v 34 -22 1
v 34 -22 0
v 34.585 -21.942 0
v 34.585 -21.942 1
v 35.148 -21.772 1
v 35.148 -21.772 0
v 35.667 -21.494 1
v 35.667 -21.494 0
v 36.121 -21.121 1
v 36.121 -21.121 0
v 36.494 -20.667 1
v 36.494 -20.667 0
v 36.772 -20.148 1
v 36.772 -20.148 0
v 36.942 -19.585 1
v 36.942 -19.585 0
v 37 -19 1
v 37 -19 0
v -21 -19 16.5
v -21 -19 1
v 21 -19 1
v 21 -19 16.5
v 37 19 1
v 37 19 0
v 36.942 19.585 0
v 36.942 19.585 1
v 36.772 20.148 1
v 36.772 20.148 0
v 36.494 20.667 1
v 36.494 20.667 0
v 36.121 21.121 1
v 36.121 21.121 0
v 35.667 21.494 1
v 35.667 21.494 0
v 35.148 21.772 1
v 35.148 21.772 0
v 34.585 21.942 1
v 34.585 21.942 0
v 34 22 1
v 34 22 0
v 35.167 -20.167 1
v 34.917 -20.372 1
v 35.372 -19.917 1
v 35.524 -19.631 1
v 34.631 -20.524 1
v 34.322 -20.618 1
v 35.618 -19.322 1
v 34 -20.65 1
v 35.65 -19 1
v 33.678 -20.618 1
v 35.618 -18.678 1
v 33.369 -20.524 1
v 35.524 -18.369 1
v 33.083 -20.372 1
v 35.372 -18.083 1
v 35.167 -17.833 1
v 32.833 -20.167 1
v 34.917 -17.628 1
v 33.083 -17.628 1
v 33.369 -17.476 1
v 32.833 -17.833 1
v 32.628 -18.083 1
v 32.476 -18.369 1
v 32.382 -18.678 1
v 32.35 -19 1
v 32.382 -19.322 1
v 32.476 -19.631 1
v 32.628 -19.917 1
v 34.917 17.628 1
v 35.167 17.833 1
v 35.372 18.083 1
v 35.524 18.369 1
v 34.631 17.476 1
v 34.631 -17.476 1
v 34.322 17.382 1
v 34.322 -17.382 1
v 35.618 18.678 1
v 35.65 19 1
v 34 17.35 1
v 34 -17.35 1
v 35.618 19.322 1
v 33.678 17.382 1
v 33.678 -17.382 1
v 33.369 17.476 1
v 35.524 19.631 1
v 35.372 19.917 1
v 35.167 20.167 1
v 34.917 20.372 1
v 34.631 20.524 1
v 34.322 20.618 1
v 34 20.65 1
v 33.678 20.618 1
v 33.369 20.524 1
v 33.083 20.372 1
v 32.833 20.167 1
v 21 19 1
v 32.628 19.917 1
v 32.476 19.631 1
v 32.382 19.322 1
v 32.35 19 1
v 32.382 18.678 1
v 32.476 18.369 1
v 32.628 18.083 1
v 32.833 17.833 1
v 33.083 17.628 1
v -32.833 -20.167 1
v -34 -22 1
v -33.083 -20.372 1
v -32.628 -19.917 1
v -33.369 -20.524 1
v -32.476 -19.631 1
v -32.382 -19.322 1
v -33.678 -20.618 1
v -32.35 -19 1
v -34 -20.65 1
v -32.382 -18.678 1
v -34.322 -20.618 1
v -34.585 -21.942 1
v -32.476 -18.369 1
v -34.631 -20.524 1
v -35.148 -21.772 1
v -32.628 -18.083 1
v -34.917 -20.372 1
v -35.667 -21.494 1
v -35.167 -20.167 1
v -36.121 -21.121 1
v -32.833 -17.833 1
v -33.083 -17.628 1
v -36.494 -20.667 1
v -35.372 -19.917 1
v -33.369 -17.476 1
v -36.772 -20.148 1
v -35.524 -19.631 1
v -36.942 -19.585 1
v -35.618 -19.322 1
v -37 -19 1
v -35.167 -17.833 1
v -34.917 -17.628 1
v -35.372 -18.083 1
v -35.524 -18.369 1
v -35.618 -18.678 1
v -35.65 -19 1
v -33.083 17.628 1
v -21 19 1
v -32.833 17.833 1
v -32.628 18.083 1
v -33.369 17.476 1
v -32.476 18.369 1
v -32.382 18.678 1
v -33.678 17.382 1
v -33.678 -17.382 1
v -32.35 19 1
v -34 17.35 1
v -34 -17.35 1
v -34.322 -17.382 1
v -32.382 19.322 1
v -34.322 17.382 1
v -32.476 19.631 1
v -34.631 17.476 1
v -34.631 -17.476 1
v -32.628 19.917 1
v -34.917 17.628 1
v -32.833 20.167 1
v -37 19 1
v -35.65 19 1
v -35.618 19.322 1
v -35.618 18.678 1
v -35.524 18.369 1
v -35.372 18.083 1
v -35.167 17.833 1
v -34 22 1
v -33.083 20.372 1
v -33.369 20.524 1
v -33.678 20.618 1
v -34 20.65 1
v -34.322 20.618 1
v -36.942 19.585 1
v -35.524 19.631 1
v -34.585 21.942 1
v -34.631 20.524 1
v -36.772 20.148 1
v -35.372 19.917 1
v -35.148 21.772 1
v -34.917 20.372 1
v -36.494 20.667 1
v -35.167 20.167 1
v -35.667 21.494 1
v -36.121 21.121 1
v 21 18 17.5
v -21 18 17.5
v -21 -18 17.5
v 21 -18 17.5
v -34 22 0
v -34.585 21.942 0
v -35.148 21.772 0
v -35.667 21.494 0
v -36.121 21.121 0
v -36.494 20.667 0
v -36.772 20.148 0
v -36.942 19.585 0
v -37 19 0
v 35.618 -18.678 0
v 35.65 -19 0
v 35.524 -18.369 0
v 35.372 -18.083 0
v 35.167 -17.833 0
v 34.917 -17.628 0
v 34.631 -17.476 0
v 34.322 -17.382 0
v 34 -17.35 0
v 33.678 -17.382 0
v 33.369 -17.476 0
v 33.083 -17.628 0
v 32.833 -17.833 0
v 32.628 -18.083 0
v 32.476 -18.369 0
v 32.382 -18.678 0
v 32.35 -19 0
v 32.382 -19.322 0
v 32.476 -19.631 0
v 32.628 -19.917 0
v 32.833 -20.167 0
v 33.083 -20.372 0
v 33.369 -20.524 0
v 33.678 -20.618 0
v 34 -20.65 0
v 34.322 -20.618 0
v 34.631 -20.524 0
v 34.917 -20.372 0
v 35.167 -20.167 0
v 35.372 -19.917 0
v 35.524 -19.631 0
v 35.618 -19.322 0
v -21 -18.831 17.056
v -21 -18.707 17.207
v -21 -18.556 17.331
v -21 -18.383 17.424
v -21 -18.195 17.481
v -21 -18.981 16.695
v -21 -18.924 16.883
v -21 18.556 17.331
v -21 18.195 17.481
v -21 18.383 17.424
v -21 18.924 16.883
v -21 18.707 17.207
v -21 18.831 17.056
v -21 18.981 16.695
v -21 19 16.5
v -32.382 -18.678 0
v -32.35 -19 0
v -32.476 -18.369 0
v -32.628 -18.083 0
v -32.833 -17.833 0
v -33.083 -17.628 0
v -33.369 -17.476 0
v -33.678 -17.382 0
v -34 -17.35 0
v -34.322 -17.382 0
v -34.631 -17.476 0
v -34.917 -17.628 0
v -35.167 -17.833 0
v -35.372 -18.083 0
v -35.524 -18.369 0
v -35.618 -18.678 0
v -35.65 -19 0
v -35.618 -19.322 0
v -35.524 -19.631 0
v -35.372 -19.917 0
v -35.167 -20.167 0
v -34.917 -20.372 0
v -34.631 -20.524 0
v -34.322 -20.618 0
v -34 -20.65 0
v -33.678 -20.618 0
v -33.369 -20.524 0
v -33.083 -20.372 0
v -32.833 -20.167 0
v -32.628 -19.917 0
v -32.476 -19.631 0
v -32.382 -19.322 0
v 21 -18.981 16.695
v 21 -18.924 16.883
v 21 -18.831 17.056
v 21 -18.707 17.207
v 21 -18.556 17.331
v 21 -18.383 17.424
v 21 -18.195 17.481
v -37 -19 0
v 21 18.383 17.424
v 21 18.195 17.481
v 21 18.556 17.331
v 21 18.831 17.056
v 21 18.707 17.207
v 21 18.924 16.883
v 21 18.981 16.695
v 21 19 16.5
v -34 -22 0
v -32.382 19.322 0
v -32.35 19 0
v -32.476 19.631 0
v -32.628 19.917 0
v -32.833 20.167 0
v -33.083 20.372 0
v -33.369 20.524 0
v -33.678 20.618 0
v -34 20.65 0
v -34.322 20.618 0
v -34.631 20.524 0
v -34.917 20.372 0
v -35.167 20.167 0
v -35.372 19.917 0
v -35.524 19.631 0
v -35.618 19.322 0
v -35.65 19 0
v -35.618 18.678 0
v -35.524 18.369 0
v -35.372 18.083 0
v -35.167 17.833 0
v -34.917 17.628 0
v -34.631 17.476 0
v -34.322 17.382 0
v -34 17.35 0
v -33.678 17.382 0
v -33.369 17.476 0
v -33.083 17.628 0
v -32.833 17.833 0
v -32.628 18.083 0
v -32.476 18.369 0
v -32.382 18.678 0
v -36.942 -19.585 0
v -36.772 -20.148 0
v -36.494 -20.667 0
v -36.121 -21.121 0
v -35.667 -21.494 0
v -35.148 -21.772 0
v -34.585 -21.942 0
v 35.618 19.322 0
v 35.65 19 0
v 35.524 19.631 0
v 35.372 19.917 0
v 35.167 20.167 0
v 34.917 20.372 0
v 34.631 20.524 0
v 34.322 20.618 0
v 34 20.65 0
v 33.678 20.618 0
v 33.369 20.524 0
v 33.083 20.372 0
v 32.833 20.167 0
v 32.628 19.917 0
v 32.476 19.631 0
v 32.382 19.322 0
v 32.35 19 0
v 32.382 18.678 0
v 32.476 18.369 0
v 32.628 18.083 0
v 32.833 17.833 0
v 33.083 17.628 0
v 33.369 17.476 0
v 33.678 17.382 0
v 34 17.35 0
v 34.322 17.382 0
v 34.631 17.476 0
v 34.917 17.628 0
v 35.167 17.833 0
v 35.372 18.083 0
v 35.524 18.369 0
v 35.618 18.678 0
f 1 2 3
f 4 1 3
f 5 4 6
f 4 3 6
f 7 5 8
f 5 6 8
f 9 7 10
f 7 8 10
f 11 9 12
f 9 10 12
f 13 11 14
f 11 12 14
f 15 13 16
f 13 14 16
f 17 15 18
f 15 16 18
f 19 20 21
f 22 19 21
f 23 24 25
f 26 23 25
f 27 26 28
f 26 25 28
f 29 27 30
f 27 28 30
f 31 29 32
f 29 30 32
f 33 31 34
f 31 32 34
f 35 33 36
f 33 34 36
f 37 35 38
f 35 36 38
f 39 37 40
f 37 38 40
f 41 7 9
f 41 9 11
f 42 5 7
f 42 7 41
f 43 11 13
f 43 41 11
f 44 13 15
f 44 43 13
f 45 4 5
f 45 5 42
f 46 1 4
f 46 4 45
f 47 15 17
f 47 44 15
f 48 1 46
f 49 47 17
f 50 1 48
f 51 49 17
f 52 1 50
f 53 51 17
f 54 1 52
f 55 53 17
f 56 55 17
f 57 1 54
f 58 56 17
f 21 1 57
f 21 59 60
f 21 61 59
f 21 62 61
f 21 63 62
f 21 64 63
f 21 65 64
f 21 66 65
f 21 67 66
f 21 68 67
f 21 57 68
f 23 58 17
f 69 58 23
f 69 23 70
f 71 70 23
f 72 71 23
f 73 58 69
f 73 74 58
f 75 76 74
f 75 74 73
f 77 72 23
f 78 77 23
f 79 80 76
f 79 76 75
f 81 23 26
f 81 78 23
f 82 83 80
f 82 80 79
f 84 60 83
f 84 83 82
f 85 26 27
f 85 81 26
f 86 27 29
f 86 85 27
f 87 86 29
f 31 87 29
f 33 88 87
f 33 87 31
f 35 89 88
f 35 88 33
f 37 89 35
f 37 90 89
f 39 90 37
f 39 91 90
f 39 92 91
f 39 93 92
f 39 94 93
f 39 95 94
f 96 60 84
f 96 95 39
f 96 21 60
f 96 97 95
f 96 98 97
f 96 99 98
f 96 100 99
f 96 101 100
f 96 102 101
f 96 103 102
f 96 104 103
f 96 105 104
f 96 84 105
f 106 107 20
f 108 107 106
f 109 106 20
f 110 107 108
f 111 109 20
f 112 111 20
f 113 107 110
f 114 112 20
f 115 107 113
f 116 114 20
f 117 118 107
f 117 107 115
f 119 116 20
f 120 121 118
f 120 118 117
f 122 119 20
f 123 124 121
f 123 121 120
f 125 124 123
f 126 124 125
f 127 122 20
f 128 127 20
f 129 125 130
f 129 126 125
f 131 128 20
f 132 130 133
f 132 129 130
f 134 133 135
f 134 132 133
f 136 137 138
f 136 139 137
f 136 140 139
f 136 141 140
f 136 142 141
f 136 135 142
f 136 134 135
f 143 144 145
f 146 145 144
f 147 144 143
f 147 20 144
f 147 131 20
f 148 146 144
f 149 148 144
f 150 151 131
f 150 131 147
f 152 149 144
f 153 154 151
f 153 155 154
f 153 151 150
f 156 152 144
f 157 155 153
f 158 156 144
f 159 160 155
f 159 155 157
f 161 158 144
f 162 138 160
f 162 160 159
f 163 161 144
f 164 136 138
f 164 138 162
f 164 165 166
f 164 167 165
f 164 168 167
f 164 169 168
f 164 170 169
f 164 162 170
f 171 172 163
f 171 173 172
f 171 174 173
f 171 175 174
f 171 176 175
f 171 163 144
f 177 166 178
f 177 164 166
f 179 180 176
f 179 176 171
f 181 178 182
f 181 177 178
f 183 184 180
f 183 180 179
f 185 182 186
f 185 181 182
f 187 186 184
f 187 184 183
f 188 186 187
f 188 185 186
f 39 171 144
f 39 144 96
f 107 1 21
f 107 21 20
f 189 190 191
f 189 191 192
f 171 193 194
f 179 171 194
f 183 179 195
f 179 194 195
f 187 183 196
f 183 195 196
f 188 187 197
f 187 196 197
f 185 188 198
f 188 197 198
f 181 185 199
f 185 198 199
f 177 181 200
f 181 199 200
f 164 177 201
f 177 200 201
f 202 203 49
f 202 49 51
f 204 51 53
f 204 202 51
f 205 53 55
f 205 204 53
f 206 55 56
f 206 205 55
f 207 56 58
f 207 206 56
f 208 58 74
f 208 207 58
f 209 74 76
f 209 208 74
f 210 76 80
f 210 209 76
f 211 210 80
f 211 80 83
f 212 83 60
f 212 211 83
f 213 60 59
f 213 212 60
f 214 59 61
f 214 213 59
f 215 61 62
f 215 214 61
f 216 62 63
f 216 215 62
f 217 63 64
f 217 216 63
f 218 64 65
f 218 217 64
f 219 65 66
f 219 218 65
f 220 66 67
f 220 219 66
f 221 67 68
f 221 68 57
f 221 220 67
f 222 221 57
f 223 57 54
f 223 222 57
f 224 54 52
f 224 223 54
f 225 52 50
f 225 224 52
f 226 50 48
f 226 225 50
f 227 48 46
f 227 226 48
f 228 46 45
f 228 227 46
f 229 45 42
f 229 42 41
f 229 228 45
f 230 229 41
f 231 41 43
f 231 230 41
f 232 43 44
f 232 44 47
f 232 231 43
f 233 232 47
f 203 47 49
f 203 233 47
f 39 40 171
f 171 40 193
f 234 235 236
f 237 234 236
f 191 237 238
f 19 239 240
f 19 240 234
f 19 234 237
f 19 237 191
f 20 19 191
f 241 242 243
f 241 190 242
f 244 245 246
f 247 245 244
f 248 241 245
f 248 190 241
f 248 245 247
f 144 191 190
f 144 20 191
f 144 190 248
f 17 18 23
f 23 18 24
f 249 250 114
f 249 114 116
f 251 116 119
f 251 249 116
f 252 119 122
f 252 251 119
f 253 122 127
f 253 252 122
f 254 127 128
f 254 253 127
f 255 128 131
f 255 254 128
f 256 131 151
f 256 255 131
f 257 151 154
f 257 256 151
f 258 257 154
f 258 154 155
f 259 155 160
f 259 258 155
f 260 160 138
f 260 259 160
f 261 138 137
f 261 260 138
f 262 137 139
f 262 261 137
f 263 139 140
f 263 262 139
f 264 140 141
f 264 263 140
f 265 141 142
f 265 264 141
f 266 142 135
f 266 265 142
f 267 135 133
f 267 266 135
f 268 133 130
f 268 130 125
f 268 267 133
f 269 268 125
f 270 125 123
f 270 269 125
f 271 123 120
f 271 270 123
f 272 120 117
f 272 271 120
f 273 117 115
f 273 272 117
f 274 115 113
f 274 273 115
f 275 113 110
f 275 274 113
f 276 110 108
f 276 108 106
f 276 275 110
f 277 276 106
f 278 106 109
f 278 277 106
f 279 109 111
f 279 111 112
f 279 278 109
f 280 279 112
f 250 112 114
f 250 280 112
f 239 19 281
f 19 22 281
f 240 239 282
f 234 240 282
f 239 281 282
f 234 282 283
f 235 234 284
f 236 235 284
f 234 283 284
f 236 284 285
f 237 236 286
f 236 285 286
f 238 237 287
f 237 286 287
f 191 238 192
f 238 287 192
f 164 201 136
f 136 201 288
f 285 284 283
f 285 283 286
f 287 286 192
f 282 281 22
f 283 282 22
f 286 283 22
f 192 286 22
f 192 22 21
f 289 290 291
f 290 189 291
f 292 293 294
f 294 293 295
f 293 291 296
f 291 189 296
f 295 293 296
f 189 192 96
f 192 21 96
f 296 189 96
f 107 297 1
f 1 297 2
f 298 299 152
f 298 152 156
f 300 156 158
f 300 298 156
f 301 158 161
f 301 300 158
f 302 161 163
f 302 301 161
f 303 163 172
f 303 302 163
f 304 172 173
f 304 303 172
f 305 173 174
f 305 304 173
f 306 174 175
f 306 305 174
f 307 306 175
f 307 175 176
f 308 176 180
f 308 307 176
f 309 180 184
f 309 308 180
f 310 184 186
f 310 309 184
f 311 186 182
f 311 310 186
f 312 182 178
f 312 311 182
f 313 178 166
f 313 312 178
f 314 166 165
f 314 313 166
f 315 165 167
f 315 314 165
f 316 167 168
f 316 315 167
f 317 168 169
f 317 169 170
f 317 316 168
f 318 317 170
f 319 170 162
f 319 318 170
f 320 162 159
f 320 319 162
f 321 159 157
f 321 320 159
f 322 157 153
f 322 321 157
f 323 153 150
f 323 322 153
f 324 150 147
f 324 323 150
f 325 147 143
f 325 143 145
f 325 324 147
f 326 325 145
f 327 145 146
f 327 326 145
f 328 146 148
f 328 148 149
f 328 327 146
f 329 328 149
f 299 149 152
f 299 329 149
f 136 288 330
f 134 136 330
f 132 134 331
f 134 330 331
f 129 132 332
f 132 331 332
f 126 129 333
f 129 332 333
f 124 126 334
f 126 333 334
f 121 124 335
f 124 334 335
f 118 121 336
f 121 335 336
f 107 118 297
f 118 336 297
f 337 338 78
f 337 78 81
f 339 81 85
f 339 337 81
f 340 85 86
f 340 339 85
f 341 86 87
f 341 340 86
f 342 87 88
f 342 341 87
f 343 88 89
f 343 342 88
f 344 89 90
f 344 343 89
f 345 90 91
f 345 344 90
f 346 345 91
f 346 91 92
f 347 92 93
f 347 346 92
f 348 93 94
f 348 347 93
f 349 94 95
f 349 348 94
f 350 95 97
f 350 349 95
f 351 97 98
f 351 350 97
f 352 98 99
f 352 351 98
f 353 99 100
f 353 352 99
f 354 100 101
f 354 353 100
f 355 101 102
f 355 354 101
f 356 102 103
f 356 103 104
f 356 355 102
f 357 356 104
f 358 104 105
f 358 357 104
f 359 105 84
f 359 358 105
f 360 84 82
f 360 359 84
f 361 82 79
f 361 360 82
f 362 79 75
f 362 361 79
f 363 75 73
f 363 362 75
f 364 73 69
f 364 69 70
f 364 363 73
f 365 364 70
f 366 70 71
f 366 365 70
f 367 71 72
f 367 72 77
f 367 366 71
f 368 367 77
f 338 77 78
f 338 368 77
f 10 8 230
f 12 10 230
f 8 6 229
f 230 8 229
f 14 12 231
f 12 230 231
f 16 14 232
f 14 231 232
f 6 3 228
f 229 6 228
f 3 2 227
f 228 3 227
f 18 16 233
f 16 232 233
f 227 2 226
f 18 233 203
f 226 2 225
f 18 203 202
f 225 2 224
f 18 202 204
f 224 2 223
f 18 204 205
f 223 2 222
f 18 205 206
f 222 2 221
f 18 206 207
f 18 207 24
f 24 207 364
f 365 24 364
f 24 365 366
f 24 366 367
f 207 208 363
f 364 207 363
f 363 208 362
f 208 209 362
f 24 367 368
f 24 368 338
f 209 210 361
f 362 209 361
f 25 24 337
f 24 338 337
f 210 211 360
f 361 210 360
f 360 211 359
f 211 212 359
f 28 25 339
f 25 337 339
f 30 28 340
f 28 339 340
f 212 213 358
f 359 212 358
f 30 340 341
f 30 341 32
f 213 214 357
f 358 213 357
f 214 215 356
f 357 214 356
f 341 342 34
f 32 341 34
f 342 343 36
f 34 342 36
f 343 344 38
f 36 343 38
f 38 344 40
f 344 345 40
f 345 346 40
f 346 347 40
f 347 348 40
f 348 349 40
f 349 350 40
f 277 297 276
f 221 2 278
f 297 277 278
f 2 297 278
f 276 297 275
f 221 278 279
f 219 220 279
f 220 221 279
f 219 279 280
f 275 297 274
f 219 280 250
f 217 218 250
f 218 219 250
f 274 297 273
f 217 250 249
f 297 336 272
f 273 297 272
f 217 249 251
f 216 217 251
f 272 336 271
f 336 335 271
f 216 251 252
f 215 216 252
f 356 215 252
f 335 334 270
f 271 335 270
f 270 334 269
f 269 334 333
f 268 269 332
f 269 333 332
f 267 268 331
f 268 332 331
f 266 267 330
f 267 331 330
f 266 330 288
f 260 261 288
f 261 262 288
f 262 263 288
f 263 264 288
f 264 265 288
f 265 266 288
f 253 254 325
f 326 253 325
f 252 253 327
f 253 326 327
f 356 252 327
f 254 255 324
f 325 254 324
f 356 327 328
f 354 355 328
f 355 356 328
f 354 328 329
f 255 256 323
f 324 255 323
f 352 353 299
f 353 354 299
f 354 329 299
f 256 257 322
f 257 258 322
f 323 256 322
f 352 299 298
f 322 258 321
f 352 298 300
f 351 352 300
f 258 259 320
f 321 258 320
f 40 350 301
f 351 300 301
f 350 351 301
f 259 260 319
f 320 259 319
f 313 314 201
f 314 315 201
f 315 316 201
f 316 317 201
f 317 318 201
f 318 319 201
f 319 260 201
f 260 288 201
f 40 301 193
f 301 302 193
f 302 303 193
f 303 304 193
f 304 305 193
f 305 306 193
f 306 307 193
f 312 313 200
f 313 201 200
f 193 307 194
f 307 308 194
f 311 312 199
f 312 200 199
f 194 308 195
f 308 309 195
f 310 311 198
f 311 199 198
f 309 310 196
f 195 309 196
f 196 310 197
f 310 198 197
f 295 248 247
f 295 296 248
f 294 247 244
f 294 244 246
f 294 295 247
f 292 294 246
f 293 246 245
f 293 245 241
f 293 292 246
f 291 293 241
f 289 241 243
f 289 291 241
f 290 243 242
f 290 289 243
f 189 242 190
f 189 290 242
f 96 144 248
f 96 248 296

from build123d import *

# Parameters (mm, degrees)
CROQUIS1_R              = 1.65
SALIENTE_EXTRUIR1_DEPTH = 1
CROQUIS3_W              = 42
CROQUIS3_H              = 38
SALIENTE_EXTRUIR2_DEPTH = 16.5
REDONDEO1_R             = 1


with BuildPart() as part:
    # Croquis1 → Saliente-Extruir1 (new body)
    with BuildSketch(Plane(origin=(0, 0, 0), x_dir=(0, 1, 0), z_dir=(0, 0, 1))):
        with BuildLine():
            Line((-19, -37), (19, -37))
            ThreePointArc((19, -37), (21.121320344, -36.121320344), (22, -34))
            Line((22, -34), (22, 34))
            ThreePointArc((22, 34), (21.121320344, 36.121320344), (19, 37))
            Line((19, 37), (-19, 37))
            ThreePointArc((-19, 37), (-21.121320344, 36.121320344), (-22, 34))
            Line((-22, 34), (-22, -34))
            ThreePointArc((-22, -34), (-21.121320344, -36.121320344), (-19, -37))
        make_face()
        with Locations(Location((-19, 34, 0), (0, 0, 270))):
            Circle(CROQUIS1_R, mode=Mode.SUBTRACT)
        with Locations(Location((19, 34, 0), (0, 0, 270))):
            Circle(CROQUIS1_R, mode=Mode.SUBTRACT)
        with Locations(Location((19, -34, 0), (0, 0, 270))):
            Circle(CROQUIS1_R, mode=Mode.SUBTRACT)
        with Locations(Location((-19, -34, 0), (0, 0, 270))):
            Circle(CROQUIS1_R, mode=Mode.SUBTRACT)
    extrude(amount=SALIENTE_EXTRUIR1_DEPTH)

    # Croquis3 → Saliente-Extruir2 (add)
    with BuildSketch(Plane.XY.offset(1)):
        Rectangle(CROQUIS3_W, CROQUIS3_H)
    extrude(amount=SALIENTE_EXTRUIR2_DEPTH)

    # Redondeo1
    redondeo1_edges = [part.edges().sort_by_distance(p)[0] for p in [
        (0, 19, 17.5),
        (0, -19, 17.5),
    ]]
    fillet(redondeo1_edges, radius=REDONDEO1_R)


solid = part.part
